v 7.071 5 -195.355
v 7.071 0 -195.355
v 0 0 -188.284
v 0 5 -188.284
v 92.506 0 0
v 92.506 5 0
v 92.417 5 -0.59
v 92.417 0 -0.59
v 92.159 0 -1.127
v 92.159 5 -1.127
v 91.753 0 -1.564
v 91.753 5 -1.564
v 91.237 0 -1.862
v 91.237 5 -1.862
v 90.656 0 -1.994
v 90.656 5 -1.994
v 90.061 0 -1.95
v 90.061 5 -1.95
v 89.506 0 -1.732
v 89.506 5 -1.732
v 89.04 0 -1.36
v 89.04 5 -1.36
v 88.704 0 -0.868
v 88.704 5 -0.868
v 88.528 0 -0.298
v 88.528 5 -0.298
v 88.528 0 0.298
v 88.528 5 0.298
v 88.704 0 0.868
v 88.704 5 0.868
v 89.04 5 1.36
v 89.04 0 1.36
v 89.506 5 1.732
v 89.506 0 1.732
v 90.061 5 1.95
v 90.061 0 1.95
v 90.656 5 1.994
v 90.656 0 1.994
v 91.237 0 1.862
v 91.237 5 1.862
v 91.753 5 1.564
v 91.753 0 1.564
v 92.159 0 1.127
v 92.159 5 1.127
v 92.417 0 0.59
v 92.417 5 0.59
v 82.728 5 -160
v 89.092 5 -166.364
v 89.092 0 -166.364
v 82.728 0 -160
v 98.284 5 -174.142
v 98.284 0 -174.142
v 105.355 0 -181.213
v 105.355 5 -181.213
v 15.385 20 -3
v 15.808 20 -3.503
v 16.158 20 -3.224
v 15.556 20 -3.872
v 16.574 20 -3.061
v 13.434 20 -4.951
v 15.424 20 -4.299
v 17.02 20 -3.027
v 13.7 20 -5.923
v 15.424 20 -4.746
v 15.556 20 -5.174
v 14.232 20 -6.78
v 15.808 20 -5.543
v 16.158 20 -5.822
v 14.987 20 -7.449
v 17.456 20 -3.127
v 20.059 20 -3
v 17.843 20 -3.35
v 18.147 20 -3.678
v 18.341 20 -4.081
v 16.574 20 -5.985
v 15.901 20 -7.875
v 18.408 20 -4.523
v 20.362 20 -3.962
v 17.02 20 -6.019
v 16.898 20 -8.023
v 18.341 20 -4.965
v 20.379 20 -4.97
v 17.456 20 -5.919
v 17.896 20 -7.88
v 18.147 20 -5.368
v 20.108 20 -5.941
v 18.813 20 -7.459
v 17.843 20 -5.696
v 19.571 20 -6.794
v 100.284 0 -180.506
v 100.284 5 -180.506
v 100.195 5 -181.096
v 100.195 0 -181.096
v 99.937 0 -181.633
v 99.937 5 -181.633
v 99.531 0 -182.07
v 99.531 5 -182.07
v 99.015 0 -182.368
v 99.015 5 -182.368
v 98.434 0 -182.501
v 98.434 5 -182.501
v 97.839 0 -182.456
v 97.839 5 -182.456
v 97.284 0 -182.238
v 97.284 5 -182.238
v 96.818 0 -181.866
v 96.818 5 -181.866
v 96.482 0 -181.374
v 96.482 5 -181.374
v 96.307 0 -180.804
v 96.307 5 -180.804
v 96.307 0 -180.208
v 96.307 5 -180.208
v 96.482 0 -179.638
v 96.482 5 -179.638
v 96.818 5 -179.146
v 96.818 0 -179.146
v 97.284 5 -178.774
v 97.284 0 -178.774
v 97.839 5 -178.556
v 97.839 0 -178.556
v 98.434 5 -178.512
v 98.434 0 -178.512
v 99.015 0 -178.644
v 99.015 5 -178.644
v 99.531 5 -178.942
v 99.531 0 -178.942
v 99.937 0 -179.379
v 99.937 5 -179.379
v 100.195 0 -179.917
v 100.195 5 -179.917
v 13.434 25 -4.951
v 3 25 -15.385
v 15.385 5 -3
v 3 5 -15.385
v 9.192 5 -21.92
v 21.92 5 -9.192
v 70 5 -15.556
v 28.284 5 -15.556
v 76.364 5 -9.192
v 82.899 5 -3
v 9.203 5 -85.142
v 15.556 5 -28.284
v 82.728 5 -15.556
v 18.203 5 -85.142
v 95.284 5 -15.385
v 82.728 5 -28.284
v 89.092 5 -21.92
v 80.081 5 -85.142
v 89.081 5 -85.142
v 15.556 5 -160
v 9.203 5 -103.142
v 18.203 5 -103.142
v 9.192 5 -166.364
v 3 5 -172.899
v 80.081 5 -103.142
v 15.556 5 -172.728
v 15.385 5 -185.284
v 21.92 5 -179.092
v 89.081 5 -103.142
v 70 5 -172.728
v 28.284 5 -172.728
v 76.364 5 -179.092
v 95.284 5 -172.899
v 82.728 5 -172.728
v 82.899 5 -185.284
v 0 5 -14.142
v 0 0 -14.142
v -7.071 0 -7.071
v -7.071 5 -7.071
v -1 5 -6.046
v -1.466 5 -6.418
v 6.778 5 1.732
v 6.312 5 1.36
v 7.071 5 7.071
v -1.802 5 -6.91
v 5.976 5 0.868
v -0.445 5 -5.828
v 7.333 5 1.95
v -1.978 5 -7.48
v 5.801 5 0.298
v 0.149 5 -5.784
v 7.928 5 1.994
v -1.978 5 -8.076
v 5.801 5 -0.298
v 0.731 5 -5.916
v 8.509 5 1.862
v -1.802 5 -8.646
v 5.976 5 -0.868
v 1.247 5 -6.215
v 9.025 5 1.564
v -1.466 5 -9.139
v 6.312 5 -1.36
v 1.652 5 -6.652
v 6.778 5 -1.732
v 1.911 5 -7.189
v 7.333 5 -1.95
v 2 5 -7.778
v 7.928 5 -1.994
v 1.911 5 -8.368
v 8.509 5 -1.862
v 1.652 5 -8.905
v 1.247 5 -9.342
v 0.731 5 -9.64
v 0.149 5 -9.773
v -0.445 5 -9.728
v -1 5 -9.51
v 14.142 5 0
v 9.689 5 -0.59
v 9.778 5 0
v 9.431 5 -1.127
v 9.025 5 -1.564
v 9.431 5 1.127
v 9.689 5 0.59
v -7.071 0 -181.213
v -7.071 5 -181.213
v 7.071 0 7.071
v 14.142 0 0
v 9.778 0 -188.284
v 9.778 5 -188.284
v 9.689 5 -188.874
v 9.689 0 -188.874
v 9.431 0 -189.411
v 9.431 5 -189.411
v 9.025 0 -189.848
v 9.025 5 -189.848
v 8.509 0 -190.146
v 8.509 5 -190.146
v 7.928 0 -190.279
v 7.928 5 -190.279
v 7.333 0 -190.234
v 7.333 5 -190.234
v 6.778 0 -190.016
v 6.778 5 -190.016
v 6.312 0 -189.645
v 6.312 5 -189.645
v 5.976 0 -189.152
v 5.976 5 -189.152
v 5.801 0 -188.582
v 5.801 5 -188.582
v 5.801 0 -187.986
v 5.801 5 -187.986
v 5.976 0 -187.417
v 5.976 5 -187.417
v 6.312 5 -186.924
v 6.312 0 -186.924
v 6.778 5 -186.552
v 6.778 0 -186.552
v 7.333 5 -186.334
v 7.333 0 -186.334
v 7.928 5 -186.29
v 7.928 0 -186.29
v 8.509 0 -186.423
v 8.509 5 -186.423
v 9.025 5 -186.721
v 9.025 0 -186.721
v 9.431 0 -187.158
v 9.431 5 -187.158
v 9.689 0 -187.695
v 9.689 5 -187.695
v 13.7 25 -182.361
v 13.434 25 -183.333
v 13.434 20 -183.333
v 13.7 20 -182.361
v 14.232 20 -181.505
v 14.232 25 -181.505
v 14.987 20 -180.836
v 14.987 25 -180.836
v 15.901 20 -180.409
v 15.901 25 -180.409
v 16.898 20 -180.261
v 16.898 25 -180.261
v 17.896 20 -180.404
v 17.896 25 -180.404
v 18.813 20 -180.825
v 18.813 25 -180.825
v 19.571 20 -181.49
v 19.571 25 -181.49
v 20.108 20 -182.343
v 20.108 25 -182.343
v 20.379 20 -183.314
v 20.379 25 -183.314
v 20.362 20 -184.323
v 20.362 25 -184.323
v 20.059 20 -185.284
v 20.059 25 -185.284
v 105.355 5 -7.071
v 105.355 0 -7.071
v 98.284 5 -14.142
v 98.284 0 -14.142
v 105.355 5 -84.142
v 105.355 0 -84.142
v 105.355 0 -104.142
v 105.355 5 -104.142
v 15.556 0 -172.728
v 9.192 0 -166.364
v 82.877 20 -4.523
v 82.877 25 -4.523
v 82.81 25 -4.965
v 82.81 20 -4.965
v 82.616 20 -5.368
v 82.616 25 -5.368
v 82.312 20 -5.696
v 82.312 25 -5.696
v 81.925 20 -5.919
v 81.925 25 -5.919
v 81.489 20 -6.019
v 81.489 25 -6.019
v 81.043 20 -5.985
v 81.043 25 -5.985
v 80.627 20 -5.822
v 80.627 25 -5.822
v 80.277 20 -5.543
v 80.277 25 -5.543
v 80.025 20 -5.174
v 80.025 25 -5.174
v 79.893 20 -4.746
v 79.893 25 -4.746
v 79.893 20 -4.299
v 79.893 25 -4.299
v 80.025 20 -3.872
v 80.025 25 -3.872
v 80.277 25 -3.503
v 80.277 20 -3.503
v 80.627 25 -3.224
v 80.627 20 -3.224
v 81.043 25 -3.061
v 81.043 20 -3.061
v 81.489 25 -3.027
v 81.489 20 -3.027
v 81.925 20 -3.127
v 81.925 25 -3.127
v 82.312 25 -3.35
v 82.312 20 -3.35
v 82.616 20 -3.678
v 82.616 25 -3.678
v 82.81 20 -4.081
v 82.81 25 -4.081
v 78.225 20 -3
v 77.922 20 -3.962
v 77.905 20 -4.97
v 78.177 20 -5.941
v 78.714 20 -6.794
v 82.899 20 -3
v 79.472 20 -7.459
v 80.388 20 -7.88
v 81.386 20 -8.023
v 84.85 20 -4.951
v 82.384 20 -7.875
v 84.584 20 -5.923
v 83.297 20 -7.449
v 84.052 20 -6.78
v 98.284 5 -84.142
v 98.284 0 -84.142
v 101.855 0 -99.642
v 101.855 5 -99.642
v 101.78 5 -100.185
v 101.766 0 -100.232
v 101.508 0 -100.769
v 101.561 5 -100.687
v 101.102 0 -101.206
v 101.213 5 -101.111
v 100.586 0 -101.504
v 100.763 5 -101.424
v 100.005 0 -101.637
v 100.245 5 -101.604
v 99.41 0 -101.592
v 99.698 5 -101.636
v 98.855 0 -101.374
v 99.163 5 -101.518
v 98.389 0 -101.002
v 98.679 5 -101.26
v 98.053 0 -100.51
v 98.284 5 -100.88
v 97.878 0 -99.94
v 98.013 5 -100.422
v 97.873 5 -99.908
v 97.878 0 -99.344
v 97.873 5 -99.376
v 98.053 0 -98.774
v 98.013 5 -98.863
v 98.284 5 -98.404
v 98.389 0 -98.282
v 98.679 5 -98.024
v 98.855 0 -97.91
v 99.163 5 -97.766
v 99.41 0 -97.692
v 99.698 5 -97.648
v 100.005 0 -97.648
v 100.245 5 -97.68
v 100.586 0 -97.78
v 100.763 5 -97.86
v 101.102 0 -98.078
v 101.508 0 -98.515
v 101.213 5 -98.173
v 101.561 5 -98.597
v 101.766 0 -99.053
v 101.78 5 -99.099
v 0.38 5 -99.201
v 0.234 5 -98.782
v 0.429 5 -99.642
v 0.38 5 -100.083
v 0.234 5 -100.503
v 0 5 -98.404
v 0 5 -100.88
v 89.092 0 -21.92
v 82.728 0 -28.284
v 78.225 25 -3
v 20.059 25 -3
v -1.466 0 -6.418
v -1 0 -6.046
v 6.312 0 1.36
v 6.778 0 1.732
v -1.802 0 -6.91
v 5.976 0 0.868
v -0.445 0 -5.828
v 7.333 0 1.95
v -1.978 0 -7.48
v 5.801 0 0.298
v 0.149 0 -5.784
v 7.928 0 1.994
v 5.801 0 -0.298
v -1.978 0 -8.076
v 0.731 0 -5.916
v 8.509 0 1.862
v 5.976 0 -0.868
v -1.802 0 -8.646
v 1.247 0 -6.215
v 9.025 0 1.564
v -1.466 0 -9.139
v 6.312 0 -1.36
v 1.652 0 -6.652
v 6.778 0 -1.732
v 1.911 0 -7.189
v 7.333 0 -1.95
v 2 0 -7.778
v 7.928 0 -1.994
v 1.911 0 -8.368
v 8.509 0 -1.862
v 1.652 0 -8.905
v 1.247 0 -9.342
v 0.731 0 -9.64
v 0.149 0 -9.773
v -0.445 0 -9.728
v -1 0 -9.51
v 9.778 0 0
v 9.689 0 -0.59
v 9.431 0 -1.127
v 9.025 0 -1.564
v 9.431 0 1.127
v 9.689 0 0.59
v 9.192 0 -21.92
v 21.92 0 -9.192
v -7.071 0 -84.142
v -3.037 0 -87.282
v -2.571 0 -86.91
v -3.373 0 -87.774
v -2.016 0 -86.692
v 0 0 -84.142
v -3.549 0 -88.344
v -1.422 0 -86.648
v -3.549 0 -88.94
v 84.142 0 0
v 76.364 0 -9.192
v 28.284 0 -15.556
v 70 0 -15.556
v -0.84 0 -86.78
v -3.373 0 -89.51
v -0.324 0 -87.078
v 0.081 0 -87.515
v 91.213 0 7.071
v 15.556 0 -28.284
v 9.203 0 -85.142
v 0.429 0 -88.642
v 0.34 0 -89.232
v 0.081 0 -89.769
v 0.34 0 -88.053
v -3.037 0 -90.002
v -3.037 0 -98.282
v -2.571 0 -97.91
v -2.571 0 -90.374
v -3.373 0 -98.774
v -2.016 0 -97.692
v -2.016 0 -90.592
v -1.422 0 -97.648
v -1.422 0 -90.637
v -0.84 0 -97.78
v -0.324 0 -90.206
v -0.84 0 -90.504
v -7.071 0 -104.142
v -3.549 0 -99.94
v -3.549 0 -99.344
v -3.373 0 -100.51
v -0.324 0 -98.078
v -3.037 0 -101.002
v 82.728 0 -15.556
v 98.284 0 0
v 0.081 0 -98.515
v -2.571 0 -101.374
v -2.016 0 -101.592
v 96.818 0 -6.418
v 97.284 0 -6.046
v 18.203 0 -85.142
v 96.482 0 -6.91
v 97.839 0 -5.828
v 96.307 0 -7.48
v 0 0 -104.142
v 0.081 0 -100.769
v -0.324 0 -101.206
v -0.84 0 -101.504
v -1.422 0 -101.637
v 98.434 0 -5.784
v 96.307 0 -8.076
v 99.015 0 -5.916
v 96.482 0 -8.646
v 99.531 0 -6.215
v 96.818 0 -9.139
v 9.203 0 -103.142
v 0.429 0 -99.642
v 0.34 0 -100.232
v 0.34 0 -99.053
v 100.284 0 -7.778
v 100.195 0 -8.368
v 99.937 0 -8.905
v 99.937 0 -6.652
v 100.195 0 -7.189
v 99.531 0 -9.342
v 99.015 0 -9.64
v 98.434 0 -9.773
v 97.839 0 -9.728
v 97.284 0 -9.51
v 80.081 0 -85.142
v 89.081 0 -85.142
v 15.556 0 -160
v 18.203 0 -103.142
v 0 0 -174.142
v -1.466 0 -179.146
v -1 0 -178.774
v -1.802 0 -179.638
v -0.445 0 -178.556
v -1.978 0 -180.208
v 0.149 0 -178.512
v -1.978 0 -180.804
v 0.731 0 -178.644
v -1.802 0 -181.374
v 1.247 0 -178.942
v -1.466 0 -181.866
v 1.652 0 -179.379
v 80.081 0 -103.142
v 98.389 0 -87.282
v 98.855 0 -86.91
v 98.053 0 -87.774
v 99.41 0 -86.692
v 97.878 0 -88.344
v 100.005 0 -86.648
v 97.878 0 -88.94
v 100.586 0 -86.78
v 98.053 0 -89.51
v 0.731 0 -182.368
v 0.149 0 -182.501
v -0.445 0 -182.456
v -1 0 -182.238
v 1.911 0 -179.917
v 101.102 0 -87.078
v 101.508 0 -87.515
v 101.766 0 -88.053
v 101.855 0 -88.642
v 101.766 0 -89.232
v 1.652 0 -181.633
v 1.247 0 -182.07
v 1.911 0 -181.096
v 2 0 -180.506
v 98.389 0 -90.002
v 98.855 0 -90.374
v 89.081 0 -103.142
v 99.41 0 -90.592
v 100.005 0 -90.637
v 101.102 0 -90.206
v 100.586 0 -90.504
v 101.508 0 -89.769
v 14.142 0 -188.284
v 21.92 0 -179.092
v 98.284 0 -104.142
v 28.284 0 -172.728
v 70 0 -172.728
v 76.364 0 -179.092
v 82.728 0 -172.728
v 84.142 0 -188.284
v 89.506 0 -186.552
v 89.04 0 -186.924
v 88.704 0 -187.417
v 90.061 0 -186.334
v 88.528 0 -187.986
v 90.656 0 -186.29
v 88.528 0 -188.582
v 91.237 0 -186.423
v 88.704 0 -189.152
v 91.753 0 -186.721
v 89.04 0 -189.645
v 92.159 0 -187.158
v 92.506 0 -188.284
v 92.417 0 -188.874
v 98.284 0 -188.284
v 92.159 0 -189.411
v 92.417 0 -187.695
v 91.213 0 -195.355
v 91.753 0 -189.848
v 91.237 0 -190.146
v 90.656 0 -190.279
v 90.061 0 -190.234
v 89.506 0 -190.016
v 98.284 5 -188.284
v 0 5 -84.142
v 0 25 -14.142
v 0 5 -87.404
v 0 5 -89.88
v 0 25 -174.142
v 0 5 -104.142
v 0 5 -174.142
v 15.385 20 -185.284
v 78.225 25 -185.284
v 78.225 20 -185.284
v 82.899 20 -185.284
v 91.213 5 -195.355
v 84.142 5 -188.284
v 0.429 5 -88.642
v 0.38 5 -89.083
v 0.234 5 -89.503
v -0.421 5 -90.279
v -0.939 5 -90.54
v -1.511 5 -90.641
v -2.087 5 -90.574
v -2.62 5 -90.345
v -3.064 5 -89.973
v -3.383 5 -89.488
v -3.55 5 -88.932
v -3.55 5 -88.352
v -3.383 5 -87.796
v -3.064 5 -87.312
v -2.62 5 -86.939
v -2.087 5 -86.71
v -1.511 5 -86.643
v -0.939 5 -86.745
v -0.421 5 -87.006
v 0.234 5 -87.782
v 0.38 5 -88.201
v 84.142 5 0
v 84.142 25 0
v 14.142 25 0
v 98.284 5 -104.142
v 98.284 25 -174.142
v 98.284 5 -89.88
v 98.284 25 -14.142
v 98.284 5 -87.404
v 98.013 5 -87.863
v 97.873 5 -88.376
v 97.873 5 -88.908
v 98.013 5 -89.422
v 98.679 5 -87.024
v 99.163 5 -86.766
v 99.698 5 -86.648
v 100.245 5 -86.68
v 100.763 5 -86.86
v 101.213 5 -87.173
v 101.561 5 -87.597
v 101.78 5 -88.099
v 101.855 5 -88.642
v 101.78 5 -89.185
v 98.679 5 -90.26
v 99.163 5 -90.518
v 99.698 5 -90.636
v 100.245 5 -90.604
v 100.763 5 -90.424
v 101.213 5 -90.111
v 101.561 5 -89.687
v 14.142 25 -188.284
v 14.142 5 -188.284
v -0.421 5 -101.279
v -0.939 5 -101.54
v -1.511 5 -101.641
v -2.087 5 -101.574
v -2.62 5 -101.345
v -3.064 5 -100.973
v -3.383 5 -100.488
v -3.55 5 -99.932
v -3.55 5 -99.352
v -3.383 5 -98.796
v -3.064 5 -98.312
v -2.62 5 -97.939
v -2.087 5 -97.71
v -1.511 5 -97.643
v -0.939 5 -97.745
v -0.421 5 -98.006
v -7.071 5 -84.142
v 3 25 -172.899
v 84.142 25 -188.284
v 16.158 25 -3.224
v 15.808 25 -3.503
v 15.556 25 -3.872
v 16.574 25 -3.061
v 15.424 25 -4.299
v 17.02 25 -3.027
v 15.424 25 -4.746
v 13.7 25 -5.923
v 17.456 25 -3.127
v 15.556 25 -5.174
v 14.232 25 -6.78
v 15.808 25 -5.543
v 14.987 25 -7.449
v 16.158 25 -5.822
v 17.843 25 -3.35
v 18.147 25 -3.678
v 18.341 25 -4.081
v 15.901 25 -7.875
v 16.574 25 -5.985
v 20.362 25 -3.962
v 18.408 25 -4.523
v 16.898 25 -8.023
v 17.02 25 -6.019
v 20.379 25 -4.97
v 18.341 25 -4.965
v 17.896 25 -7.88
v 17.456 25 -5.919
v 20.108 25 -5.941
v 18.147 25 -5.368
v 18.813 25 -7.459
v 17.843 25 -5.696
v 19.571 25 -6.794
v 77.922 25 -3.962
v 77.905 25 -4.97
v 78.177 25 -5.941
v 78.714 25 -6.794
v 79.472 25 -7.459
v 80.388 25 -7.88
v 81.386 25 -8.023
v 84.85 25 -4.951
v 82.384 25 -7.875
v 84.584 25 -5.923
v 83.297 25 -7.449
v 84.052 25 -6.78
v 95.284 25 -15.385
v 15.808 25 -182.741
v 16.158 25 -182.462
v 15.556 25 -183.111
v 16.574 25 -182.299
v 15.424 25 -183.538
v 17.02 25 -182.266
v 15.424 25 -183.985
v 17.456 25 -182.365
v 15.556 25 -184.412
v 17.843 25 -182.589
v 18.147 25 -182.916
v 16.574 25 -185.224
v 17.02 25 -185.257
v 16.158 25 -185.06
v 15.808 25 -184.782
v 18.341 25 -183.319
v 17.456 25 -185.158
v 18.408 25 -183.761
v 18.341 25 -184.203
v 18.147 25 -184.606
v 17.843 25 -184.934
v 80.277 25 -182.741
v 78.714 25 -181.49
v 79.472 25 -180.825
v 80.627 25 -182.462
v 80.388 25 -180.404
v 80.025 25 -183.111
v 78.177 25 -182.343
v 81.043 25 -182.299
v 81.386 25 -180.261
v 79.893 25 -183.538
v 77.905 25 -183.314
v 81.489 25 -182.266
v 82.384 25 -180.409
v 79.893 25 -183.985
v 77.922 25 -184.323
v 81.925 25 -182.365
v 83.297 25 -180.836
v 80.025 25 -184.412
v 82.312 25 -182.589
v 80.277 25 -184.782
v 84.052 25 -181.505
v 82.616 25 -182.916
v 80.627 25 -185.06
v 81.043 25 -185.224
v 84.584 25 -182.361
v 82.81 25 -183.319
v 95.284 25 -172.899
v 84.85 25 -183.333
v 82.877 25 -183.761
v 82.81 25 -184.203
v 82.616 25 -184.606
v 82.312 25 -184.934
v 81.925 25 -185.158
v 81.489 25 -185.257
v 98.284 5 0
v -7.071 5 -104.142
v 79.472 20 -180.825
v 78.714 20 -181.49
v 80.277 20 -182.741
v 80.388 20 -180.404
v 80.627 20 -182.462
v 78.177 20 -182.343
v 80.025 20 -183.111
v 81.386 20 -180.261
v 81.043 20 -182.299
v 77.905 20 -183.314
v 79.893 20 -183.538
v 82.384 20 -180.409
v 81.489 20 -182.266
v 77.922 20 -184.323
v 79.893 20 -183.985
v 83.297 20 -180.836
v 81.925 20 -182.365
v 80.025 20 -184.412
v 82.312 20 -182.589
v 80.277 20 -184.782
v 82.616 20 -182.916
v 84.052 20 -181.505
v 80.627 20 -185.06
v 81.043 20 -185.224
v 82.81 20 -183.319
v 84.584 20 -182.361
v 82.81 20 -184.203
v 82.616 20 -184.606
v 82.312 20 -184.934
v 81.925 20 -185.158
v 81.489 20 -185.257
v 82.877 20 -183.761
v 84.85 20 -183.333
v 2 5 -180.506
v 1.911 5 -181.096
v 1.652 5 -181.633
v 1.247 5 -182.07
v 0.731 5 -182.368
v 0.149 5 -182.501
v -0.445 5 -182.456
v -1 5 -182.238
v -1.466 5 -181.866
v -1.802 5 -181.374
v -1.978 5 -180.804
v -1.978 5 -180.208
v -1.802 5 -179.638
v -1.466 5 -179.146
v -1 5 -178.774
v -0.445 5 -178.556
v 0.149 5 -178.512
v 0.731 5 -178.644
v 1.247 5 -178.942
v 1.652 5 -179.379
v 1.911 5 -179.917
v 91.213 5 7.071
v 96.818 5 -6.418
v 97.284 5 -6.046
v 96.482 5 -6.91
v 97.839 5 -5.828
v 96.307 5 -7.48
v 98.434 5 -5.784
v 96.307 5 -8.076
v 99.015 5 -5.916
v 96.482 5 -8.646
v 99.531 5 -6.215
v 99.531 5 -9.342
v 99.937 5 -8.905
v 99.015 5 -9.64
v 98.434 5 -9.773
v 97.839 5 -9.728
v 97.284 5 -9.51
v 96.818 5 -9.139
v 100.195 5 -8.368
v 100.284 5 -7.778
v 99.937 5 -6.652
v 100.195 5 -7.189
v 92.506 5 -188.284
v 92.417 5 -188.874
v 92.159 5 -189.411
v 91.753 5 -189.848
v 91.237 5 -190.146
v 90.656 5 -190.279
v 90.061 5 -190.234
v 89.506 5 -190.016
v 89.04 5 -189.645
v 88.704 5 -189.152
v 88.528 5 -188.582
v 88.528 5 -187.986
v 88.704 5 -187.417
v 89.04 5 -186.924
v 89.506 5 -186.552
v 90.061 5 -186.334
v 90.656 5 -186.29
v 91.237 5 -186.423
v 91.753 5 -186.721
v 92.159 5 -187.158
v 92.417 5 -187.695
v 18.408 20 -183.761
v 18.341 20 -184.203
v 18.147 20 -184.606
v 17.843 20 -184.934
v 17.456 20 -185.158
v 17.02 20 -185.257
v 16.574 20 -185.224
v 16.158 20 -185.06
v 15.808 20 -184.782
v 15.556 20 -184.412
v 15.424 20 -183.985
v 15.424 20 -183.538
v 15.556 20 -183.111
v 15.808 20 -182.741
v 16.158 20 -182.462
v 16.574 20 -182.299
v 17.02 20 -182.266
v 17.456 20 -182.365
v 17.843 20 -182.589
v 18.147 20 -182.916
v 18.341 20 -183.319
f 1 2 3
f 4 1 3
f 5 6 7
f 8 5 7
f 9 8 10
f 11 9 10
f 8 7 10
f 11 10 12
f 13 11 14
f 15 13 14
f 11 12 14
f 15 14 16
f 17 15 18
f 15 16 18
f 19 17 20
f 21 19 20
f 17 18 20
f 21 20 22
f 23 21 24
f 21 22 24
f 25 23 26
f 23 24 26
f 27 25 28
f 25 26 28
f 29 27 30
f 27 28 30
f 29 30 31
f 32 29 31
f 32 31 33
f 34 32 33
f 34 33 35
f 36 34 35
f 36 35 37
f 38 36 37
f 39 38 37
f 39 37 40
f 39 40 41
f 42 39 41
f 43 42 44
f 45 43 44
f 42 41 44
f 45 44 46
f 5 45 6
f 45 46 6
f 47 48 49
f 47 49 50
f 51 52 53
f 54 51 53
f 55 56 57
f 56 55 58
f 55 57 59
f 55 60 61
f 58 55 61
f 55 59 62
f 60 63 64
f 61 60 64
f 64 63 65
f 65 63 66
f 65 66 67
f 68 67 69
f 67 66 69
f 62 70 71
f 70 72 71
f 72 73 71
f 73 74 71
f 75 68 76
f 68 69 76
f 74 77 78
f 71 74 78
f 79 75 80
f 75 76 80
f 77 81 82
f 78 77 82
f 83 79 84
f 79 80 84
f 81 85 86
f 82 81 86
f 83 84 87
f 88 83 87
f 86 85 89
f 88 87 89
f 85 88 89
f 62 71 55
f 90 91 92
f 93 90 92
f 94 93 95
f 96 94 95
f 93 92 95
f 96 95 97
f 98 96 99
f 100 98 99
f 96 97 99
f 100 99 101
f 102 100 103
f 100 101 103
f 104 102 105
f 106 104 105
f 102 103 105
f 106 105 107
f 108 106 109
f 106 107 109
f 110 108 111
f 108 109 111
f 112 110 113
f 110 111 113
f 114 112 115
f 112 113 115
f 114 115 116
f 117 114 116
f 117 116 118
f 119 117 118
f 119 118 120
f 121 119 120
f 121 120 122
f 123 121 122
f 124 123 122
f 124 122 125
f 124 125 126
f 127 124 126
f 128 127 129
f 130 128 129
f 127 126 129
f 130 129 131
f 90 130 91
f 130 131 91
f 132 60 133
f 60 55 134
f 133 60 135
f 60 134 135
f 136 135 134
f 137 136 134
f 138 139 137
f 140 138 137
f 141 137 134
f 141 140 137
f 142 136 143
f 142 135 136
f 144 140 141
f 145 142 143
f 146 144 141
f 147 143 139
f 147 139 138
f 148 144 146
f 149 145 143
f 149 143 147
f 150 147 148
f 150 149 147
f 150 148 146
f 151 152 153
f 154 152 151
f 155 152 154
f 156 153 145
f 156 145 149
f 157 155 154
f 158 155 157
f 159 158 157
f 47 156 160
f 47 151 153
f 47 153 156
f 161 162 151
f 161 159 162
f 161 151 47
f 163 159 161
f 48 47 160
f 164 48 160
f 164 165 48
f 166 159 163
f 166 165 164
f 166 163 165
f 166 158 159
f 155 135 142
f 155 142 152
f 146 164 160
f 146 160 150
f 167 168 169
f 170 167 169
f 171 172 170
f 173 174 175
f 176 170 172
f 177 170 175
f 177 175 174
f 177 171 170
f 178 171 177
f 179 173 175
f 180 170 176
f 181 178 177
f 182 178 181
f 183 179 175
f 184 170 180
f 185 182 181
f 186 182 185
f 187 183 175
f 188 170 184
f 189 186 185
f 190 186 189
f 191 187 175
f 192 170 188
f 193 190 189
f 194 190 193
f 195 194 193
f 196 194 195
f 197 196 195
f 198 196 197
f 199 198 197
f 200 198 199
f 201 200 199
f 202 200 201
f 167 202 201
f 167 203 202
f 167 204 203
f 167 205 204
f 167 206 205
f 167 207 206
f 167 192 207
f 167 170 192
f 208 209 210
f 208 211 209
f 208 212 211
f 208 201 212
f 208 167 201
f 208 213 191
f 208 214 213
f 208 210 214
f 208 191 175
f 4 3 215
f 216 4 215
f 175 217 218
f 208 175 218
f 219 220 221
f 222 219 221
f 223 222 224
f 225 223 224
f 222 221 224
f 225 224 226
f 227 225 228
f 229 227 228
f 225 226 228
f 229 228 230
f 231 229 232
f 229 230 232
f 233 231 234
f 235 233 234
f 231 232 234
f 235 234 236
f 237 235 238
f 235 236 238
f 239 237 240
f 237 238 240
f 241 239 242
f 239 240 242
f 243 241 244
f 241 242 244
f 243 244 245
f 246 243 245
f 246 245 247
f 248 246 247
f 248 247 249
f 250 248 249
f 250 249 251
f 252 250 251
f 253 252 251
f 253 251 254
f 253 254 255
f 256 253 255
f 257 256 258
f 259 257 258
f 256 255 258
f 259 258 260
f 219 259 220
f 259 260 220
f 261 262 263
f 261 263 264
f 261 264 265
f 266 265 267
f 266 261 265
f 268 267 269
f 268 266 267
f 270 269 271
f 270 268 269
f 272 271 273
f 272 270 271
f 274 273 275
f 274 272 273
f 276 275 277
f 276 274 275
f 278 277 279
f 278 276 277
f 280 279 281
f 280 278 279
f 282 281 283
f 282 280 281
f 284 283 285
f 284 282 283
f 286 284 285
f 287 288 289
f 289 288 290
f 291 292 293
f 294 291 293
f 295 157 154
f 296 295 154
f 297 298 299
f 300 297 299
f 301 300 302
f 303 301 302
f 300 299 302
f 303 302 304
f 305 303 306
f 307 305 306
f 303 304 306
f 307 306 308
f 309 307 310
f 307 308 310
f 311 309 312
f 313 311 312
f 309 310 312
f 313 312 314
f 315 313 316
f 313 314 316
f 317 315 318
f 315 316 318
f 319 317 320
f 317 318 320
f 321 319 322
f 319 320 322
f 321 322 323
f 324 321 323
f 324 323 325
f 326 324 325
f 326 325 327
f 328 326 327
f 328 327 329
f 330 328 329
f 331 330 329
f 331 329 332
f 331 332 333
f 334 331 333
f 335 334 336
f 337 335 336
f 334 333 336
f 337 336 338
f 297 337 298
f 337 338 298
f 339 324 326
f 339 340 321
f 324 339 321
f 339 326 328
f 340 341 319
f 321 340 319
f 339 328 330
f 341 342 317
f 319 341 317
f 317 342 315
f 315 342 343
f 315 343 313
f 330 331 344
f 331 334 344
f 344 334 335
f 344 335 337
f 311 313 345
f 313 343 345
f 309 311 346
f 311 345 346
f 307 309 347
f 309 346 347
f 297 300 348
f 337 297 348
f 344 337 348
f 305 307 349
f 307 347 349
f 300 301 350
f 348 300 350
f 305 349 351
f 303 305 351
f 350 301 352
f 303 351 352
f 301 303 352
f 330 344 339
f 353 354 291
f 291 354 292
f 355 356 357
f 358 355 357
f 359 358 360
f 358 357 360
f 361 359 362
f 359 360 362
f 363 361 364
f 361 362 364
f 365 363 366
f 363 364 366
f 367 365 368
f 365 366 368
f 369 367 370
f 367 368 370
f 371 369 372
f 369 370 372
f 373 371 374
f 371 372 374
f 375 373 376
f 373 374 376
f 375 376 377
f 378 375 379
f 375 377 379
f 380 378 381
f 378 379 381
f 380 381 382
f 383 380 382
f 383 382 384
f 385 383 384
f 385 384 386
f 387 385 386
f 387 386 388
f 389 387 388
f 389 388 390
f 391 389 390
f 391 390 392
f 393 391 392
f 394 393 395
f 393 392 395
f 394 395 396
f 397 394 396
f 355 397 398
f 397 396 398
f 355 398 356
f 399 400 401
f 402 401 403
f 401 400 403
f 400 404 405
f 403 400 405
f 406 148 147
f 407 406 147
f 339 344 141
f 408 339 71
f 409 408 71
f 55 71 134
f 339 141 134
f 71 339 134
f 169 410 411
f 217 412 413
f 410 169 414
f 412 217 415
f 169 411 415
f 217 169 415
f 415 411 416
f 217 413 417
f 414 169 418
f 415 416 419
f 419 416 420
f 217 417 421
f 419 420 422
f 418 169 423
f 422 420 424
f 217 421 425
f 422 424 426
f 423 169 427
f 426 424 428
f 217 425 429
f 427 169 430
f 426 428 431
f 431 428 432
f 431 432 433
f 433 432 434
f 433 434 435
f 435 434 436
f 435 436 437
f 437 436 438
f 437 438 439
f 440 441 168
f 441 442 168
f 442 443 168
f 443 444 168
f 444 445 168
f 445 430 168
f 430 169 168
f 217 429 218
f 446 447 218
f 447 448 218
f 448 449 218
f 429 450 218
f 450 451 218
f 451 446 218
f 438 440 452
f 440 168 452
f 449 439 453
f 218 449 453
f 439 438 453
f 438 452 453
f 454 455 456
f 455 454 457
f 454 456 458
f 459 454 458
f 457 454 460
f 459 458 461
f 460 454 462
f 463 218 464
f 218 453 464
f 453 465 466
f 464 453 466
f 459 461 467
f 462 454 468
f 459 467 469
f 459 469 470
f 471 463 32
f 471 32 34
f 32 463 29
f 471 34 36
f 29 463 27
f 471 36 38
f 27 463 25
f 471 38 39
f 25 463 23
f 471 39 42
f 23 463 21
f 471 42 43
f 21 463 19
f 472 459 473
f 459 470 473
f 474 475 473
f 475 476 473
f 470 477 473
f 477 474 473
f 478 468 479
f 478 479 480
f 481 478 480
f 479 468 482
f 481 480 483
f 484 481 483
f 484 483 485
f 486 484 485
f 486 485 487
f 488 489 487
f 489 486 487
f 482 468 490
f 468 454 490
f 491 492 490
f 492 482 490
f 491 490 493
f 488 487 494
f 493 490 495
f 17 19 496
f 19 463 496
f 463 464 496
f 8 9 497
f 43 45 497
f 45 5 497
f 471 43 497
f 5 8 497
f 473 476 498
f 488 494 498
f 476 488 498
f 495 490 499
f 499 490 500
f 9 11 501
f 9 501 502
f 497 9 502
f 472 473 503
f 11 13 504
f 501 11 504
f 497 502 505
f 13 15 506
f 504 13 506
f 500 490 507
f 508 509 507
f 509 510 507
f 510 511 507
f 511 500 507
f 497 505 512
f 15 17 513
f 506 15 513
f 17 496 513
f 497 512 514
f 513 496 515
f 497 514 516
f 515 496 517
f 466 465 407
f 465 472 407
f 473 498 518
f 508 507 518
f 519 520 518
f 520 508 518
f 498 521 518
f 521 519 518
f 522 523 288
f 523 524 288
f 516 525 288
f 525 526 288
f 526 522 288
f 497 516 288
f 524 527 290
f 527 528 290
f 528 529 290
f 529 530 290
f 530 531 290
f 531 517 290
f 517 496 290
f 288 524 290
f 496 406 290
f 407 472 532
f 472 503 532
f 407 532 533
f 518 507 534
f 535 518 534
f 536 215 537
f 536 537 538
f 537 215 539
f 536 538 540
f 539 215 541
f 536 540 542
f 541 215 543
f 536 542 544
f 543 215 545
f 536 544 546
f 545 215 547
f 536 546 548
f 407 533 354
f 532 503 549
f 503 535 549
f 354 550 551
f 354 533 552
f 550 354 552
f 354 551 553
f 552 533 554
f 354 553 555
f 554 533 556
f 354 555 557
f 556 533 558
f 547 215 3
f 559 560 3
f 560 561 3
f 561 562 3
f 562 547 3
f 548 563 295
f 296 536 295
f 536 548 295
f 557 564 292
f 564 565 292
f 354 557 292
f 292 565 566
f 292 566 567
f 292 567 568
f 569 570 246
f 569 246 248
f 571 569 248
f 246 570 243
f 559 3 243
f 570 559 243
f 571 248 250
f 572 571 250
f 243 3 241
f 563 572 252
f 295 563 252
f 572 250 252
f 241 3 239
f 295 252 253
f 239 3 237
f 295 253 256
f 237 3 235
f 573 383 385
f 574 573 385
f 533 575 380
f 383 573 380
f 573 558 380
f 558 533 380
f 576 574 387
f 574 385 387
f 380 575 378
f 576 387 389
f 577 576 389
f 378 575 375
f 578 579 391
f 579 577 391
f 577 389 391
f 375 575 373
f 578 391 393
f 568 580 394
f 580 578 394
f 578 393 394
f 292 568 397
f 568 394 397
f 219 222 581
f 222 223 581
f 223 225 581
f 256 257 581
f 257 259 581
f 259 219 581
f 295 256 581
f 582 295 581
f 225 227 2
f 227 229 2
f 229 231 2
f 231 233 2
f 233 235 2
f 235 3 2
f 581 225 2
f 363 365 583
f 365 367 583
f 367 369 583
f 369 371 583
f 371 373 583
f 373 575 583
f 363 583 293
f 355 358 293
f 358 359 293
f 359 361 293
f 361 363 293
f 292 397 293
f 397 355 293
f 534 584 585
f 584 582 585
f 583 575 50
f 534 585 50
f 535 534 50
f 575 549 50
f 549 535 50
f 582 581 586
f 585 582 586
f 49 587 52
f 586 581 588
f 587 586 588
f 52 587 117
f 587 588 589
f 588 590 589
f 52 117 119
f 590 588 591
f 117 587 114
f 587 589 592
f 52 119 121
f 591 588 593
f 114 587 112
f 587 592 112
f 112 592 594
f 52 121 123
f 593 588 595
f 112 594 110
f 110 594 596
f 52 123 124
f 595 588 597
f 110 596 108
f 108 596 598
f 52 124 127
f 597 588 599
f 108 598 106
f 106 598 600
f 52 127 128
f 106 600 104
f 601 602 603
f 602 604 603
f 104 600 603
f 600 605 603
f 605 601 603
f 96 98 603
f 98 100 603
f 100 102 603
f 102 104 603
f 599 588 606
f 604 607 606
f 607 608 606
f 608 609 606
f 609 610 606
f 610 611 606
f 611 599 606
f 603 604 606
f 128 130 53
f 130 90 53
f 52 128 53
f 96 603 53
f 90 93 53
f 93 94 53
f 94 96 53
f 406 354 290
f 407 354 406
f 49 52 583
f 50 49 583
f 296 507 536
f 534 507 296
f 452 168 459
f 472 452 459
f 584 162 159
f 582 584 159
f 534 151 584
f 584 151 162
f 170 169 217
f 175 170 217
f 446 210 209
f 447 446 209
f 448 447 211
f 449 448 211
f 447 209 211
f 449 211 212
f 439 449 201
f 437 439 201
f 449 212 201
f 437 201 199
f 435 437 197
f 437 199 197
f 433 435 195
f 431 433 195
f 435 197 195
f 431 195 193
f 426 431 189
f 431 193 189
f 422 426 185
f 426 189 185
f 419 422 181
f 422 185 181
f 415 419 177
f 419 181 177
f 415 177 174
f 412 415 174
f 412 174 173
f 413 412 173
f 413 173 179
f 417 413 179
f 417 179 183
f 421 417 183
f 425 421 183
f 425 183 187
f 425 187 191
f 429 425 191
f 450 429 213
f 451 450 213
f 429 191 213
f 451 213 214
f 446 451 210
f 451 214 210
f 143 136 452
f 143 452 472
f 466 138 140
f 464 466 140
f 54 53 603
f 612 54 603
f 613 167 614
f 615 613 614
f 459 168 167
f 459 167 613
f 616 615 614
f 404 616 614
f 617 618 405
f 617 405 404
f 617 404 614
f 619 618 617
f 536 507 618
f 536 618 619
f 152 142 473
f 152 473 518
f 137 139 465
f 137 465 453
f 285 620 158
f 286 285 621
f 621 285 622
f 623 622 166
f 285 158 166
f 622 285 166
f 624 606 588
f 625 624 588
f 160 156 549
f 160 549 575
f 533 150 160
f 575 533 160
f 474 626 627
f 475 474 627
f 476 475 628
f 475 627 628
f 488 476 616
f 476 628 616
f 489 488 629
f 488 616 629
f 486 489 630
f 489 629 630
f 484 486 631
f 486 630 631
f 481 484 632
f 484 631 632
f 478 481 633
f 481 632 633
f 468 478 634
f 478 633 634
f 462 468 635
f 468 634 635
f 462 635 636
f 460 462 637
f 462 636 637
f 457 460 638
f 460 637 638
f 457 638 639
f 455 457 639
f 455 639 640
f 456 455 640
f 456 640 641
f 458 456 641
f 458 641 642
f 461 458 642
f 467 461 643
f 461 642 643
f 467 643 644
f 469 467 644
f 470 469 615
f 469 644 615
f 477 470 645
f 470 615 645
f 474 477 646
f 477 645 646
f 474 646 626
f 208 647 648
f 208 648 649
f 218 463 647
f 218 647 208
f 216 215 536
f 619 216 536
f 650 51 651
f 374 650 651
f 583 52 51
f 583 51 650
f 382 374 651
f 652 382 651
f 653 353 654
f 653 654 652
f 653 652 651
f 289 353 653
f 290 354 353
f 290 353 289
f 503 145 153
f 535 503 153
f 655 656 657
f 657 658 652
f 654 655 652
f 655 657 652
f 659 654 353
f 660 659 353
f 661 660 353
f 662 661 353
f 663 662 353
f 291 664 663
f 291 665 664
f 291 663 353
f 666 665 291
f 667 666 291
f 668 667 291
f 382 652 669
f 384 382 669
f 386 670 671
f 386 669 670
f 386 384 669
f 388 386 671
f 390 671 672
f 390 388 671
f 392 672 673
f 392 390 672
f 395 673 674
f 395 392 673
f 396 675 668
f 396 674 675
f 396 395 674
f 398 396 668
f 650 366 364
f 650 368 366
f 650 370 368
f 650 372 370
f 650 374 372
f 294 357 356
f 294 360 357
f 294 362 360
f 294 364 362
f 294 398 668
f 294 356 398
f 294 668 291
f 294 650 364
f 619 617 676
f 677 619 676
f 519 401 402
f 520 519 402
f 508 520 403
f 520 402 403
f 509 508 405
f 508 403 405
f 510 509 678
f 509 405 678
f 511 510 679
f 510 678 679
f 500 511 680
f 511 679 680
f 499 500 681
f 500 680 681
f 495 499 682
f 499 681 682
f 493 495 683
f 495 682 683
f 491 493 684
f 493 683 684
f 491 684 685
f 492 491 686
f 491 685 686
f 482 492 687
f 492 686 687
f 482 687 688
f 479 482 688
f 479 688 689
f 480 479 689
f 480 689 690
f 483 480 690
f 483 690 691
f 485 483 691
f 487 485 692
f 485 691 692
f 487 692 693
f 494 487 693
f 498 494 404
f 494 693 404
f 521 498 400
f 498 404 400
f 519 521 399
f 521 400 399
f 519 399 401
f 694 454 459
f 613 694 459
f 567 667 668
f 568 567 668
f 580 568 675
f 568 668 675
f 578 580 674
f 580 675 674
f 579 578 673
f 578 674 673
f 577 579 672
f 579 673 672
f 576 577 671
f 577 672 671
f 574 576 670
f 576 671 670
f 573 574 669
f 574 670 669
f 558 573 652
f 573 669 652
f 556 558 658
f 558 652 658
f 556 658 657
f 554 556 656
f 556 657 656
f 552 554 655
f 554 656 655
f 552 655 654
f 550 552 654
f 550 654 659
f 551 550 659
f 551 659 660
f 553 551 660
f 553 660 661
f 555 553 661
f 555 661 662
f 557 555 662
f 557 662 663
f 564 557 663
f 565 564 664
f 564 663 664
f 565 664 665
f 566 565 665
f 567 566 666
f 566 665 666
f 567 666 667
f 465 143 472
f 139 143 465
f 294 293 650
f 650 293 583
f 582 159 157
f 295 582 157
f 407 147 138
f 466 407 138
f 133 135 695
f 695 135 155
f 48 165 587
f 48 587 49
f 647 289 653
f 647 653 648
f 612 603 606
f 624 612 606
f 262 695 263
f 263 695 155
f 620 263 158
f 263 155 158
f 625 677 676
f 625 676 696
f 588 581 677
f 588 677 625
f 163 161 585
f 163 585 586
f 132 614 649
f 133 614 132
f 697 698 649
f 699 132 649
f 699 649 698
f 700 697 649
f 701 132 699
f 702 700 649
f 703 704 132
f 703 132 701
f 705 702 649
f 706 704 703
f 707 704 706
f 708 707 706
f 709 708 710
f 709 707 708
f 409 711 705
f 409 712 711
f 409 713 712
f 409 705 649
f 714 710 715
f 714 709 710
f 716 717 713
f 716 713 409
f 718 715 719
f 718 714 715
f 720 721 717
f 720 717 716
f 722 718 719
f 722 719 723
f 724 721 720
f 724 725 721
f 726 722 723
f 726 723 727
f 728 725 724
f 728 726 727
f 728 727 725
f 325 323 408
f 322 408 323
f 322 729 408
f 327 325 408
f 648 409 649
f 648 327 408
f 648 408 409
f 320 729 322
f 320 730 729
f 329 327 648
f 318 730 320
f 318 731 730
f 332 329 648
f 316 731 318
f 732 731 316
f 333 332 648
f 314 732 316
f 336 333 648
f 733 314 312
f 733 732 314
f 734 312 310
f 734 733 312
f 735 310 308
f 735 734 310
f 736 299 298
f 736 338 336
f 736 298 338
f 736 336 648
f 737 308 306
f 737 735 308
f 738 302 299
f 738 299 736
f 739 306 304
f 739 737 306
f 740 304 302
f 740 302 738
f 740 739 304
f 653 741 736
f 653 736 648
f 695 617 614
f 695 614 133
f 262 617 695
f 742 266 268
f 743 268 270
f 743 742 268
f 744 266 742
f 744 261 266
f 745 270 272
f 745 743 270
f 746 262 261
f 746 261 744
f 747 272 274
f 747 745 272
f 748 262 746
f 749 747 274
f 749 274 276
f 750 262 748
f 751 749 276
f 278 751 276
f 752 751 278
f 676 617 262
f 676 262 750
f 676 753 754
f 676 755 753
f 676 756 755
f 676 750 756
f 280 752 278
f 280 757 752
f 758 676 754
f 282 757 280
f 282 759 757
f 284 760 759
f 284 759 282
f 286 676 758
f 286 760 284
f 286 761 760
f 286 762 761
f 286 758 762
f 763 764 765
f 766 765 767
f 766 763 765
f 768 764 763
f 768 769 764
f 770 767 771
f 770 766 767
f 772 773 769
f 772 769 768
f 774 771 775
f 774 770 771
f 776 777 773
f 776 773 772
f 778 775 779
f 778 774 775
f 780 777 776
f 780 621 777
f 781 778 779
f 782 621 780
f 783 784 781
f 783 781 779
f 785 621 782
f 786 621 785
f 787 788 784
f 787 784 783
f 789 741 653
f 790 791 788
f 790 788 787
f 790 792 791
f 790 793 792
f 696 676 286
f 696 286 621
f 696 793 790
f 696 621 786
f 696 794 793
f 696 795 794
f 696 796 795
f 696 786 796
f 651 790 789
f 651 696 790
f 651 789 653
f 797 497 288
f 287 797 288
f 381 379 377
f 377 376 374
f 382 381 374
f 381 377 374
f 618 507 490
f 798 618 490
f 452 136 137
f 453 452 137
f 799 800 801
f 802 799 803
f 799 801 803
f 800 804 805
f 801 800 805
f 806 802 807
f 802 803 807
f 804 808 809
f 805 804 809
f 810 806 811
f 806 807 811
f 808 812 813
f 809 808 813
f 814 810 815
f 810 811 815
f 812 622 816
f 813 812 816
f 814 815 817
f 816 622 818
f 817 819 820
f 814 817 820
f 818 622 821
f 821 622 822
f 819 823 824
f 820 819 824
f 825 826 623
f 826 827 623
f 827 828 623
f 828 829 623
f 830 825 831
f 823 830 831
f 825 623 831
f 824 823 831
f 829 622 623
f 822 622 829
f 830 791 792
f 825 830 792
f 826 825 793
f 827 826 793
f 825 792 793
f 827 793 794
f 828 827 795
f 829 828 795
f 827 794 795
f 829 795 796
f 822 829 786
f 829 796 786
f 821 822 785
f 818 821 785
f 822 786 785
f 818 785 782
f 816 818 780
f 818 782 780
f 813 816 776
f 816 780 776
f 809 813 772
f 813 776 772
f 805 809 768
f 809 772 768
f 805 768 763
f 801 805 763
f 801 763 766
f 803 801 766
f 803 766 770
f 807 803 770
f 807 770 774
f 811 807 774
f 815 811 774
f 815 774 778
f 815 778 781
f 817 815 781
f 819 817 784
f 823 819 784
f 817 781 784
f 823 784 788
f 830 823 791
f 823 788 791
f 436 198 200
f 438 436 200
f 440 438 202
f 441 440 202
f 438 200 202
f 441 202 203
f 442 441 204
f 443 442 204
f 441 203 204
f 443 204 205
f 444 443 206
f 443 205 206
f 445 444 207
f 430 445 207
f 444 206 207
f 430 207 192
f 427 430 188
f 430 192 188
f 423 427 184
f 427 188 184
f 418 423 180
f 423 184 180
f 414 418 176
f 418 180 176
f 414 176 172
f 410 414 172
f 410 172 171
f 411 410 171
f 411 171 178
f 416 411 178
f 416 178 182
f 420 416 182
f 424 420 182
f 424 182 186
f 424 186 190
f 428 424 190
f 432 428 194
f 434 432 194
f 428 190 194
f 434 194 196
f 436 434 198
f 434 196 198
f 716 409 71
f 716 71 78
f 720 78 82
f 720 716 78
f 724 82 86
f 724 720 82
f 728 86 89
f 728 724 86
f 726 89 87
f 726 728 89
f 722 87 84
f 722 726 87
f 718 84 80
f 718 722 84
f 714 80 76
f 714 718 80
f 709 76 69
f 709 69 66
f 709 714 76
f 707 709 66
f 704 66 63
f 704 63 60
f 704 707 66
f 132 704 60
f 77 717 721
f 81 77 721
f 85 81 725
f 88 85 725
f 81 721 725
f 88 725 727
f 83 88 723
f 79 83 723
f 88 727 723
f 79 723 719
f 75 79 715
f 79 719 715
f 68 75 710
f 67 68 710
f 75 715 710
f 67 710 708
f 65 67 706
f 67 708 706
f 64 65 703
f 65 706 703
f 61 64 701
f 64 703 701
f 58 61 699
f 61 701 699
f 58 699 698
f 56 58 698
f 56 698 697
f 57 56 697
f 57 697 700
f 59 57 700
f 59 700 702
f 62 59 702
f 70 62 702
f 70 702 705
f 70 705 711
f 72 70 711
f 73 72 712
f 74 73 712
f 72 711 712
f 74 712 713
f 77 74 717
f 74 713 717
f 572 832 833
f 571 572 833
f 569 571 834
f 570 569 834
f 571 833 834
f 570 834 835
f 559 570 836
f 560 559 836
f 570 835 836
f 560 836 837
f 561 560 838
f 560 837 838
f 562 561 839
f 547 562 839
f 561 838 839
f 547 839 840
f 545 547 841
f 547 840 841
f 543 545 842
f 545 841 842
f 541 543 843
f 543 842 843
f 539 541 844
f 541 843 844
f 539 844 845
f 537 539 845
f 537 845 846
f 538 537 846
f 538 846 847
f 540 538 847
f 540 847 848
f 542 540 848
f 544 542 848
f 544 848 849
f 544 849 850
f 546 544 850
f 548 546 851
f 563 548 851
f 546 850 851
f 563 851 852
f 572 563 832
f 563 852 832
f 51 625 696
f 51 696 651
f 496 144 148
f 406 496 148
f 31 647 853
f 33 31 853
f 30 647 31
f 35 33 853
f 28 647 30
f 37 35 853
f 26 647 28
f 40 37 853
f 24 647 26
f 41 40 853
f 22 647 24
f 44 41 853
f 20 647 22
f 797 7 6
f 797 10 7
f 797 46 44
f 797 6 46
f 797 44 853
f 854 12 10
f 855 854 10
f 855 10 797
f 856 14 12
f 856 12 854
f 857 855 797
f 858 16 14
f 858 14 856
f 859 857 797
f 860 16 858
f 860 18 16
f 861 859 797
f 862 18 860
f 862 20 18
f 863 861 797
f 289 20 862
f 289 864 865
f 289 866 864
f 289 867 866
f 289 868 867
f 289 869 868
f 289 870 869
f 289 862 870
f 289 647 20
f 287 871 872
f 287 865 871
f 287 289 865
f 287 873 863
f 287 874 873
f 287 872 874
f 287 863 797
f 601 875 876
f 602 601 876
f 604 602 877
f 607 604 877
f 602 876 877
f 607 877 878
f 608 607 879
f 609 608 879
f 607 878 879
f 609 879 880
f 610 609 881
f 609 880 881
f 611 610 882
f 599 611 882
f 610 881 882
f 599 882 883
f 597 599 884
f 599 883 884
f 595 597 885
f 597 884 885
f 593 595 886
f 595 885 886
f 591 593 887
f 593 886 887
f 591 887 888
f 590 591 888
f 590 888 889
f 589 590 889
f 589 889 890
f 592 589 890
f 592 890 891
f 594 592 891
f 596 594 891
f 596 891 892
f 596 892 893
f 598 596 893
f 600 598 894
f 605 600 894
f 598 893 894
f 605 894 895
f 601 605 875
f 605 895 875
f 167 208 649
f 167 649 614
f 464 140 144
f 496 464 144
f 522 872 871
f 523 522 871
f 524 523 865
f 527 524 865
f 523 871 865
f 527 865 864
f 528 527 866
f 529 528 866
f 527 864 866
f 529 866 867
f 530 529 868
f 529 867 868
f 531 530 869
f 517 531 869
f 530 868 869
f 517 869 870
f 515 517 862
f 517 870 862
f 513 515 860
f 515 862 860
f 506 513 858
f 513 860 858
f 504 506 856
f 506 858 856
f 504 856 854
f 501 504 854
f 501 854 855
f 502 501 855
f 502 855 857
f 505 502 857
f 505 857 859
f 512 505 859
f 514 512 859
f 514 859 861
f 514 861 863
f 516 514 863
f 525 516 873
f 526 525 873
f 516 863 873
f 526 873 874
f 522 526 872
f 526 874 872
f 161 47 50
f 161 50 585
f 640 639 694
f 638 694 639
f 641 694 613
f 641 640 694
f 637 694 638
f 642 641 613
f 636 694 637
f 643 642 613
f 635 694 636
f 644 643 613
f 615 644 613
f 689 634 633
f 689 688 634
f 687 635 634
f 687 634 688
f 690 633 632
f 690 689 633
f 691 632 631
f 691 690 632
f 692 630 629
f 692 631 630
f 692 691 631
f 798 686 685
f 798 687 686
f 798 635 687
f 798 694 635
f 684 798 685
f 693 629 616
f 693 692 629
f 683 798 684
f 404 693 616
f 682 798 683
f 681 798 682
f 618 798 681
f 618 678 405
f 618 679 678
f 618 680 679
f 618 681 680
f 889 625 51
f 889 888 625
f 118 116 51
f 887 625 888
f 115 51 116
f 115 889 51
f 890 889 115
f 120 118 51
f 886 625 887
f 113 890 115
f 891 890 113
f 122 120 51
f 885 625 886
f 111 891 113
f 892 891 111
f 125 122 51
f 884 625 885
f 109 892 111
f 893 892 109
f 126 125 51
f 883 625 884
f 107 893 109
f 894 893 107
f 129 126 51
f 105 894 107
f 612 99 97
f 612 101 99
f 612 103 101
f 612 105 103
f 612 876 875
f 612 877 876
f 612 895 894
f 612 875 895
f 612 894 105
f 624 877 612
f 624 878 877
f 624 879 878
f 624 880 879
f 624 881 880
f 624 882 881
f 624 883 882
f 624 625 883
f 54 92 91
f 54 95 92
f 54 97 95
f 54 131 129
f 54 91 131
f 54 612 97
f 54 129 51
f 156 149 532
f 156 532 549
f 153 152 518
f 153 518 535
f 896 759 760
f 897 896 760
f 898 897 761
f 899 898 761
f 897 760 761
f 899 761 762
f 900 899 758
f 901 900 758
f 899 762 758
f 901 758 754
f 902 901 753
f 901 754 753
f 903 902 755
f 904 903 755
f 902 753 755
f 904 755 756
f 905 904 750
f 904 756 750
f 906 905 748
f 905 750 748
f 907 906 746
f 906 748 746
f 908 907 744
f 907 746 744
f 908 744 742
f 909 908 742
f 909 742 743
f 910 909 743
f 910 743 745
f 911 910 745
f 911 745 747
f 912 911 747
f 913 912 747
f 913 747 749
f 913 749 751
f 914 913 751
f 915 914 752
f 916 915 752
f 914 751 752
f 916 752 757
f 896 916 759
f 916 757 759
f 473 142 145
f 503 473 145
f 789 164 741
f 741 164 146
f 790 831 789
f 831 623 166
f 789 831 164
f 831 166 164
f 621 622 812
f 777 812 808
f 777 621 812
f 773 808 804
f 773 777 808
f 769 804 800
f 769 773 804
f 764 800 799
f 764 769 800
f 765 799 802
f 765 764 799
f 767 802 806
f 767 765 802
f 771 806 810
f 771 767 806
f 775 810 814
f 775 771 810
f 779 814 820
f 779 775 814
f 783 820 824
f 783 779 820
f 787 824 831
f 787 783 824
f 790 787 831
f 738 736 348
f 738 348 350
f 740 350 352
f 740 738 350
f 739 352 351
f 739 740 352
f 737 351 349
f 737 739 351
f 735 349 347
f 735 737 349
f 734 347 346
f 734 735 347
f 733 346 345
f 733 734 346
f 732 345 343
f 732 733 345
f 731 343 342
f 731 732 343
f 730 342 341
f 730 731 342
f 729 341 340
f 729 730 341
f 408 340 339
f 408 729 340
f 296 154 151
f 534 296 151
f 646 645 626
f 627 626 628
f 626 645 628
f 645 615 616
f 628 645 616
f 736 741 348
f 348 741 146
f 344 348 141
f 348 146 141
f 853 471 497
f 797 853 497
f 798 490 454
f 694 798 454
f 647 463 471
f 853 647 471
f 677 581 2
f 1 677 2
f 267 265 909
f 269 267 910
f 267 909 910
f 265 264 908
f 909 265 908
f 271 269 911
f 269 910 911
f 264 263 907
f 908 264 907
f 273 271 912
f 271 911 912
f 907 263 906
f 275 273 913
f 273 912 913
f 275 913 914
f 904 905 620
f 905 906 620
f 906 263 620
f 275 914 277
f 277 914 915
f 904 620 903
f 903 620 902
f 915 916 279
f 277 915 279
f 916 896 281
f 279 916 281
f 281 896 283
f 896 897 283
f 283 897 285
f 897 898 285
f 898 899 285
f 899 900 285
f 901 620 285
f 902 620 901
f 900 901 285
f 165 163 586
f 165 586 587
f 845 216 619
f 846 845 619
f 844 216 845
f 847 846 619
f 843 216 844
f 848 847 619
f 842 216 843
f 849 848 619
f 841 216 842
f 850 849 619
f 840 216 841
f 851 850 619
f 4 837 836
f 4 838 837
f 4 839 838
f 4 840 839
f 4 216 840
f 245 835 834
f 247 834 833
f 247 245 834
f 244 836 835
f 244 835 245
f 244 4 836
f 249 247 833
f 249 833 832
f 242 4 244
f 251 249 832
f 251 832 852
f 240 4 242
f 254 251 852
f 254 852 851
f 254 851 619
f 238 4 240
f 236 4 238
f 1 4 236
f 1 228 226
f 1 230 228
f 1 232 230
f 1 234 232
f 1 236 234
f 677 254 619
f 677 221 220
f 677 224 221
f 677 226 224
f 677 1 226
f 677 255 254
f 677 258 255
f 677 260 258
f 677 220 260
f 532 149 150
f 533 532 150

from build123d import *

# Parameters (mm, degrees)
BOSS_EXTRUDE1_DEPTH = 5
BOSS_EXTRUDE3_DEPTH = 20
SKETCH5_W           = 9
SKETCH5_H           = 18
CUT_EXTRUDE3_DEPTH  = 20
SKETCH6_R           = 3.5
SKETCH6_R_2         = 1.5
BOSS_EXTRUDE4_DEPTH = 5
SKETCH7_R           = 2
CUT_EXTRUDE4_DEPTH  = 5


with BuildPart() as part:
    # Sketch1 → Boss-Extrude1 (new body)
    with BuildSketch(Plane(origin=(0, 0, 0), x_dir=(1, 0, 0), z_dir=(0, 1, 0))):
        Polygon((14.142135624, 0), (84.142135624, 0), (91.213203436, -7.071067812), (98.284271247, 0), (105.355339059, 7.071067812), (98.284271247, 14.142135624), (98.284271247, 84.142135624), (105.355339059, 84.142135624), (105.355339059, 104.142135624), (98.284271247, 104.142135624), (98.284271247, 174.142135624), (105.355339059, 181.213203436), (98.284271247, 188.284271247), (91.213203436, 195.355339059), (84.142135624, 188.284271247), (14.142135624, 188.284271247), (7.071067812, 195.355339059), (0, 188.284271247), (-7.071067812, 181.213203436), (0, 174.142135624), (0, 104.142135624), (-7.071067812, 104.142135624), (-7.071067812, 84.142135624), (0, 84.142135624), (0, 14.142135624), (-7.071067812, 7.071067812), (0, 0), (7.071067812, -7.071067812), align=None)
    extrude(amount=BOSS_EXTRUDE1_DEPTH)

    # Sketch4 → Boss-Extrude3 (add)
    with BuildSketch(Plane(origin=(0, 5, 0), x_dir=(1, 0, 0), z_dir=(0, 1, 0))):
        Polygon((0, 174.142135624), (14.142135624, 188.284271247), (84.142135624, 188.284271247), (98.284271247, 174.142135624), (98.284271247, 14.142135624), (84.142135624, 0), (14.142135624, 0), (0, 14.142135624), align=None)
        Polygon((3, 15.384776311), (3, 172.899494937), (15.384776311, 185.284271247), (82.899494937, 185.284271247), (95.284271247, 172.899494937), (95.284271247, 15.384776311), (82.899494937, 3), (15.384776311, 3), align=None, mode=Mode.SUBTRACT)
    extrude(amount=BOSS_EXTRUDE3_DEPTH)

    # Sketch5 → Cut-Extrude3 (cut)
    with BuildSketch(Plane(origin=(0, 5, 0), x_dir=(1, 0, 0), z_dir=(0, 1, 0))):
        Polygon((70, 15.556349186), (76.363961031, 9.192388155), (82.727922061, 15.556349186), (89.091883092, 21.920310217), (82.727922061, 28.284271247), align=None)
        Polygon((21.920310217, 9.192388155), (15.556349186, 15.556349186), (9.192388155, 21.920310217), (15.556349186, 28.284271247), (28.284271247, 15.556349186), align=None)
        with Locations((13.702828803, 94.142135624)):
            Rectangle(SKETCH5_W, SKETCH5_H)
        with Locations((84.581442444, 94.142135624)):
            Rectangle(SKETCH5_W, SKETCH5_H)
        Polygon((76.363961031, 179.091883092), (82.727922061, 172.727922061), (89.091883092, 166.363961031), (82.727922061, 160), (70, 172.727922061), align=None)
        Polygon((15.556349186, 160), (28.284271247, 172.727922061), (21.920310217, 179.091883092), (15.556349186, 172.727922061), (9.192388155, 166.363961031), align=None)
    extrude(amount=-CUT_EXTRUDE3_DEPTH, mode=Mode.SUBTRACT)

    # Sketch6 → Boss-Extrude4 (add)
    with BuildSketch(Plane(origin=(0, 25, 0), x_dir=(1, 0, 0), z_dir=(0, 1, 0))):
        with Locations((16.907704548, 183.761343011)):
            Circle(SKETCH6_R)
        with Locations((16.907704548, 183.761343011)):
            Circle(SKETCH6_R_2, mode=Mode.SUBTRACT)
        with Locations((81.3765667, 183.761343011)):
            Circle(SKETCH6_R)
        with Locations((81.3765667, 183.761343011)):
            Circle(SKETCH6_R_2, mode=Mode.SUBTRACT)
        with Locations((81.3765667, 4.522928237)):
            Circle(SKETCH6_R)
        with Locations((81.3765667, 4.522928237)):
            Circle(SKETCH6_R_2, mode=Mode.SUBTRACT)
        with Locations((16.907704548, 4.522928237)):
            Circle(SKETCH6_R)
        with Locations((16.907704548, 4.522928237)):
            Circle(SKETCH6_R_2, mode=Mode.SUBTRACT)
    extrude(amount=-BOSS_EXTRUDE4_DEPTH)

    # Sketch7 → Cut-Extrude4 (cut)
    with BuildSketch(Plane(origin=(0, 5, 0), x_dir=(1, 0, 0), z_dir=(0, 1, 0))):
        with Locations((7.778174593, 188.284271247)):
            Circle(SKETCH7_R)
        with Locations((0, 180.506096654)):
            Circle(SKETCH7_R)
        with Locations((90.506096654, 188.284271247)):
            Circle(SKETCH7_R)
        with Locations((98.284271247, 180.506096654)):
            Circle(SKETCH7_R)
        with Locations((99.855339059, 99.642135624)):
            Circle(SKETCH7_R)
        with Locations((99.855339059, 88.642135624)):
            Circle(SKETCH7_R)
        with Locations((98.284271247, 7.778174593)):
            Circle(SKETCH7_R)
        with Locations((90.506096654, 0)):
            Circle(SKETCH7_R)
        with Locations((7.778174593, 0)):
            Circle(SKETCH7_R)
        with Locations((0, 7.778174593)):
            Circle(SKETCH7_R)
        with Locations((-1.571067812, 88.642135624)):
            Circle(SKETCH7_R)
        with Locations((-1.571067812, 99.642135624)):
            Circle(SKETCH7_R)
    extrude(amount=-CUT_EXTRUDE4_DEPTH, mode=Mode.SUBTRACT)


solid = part.part
